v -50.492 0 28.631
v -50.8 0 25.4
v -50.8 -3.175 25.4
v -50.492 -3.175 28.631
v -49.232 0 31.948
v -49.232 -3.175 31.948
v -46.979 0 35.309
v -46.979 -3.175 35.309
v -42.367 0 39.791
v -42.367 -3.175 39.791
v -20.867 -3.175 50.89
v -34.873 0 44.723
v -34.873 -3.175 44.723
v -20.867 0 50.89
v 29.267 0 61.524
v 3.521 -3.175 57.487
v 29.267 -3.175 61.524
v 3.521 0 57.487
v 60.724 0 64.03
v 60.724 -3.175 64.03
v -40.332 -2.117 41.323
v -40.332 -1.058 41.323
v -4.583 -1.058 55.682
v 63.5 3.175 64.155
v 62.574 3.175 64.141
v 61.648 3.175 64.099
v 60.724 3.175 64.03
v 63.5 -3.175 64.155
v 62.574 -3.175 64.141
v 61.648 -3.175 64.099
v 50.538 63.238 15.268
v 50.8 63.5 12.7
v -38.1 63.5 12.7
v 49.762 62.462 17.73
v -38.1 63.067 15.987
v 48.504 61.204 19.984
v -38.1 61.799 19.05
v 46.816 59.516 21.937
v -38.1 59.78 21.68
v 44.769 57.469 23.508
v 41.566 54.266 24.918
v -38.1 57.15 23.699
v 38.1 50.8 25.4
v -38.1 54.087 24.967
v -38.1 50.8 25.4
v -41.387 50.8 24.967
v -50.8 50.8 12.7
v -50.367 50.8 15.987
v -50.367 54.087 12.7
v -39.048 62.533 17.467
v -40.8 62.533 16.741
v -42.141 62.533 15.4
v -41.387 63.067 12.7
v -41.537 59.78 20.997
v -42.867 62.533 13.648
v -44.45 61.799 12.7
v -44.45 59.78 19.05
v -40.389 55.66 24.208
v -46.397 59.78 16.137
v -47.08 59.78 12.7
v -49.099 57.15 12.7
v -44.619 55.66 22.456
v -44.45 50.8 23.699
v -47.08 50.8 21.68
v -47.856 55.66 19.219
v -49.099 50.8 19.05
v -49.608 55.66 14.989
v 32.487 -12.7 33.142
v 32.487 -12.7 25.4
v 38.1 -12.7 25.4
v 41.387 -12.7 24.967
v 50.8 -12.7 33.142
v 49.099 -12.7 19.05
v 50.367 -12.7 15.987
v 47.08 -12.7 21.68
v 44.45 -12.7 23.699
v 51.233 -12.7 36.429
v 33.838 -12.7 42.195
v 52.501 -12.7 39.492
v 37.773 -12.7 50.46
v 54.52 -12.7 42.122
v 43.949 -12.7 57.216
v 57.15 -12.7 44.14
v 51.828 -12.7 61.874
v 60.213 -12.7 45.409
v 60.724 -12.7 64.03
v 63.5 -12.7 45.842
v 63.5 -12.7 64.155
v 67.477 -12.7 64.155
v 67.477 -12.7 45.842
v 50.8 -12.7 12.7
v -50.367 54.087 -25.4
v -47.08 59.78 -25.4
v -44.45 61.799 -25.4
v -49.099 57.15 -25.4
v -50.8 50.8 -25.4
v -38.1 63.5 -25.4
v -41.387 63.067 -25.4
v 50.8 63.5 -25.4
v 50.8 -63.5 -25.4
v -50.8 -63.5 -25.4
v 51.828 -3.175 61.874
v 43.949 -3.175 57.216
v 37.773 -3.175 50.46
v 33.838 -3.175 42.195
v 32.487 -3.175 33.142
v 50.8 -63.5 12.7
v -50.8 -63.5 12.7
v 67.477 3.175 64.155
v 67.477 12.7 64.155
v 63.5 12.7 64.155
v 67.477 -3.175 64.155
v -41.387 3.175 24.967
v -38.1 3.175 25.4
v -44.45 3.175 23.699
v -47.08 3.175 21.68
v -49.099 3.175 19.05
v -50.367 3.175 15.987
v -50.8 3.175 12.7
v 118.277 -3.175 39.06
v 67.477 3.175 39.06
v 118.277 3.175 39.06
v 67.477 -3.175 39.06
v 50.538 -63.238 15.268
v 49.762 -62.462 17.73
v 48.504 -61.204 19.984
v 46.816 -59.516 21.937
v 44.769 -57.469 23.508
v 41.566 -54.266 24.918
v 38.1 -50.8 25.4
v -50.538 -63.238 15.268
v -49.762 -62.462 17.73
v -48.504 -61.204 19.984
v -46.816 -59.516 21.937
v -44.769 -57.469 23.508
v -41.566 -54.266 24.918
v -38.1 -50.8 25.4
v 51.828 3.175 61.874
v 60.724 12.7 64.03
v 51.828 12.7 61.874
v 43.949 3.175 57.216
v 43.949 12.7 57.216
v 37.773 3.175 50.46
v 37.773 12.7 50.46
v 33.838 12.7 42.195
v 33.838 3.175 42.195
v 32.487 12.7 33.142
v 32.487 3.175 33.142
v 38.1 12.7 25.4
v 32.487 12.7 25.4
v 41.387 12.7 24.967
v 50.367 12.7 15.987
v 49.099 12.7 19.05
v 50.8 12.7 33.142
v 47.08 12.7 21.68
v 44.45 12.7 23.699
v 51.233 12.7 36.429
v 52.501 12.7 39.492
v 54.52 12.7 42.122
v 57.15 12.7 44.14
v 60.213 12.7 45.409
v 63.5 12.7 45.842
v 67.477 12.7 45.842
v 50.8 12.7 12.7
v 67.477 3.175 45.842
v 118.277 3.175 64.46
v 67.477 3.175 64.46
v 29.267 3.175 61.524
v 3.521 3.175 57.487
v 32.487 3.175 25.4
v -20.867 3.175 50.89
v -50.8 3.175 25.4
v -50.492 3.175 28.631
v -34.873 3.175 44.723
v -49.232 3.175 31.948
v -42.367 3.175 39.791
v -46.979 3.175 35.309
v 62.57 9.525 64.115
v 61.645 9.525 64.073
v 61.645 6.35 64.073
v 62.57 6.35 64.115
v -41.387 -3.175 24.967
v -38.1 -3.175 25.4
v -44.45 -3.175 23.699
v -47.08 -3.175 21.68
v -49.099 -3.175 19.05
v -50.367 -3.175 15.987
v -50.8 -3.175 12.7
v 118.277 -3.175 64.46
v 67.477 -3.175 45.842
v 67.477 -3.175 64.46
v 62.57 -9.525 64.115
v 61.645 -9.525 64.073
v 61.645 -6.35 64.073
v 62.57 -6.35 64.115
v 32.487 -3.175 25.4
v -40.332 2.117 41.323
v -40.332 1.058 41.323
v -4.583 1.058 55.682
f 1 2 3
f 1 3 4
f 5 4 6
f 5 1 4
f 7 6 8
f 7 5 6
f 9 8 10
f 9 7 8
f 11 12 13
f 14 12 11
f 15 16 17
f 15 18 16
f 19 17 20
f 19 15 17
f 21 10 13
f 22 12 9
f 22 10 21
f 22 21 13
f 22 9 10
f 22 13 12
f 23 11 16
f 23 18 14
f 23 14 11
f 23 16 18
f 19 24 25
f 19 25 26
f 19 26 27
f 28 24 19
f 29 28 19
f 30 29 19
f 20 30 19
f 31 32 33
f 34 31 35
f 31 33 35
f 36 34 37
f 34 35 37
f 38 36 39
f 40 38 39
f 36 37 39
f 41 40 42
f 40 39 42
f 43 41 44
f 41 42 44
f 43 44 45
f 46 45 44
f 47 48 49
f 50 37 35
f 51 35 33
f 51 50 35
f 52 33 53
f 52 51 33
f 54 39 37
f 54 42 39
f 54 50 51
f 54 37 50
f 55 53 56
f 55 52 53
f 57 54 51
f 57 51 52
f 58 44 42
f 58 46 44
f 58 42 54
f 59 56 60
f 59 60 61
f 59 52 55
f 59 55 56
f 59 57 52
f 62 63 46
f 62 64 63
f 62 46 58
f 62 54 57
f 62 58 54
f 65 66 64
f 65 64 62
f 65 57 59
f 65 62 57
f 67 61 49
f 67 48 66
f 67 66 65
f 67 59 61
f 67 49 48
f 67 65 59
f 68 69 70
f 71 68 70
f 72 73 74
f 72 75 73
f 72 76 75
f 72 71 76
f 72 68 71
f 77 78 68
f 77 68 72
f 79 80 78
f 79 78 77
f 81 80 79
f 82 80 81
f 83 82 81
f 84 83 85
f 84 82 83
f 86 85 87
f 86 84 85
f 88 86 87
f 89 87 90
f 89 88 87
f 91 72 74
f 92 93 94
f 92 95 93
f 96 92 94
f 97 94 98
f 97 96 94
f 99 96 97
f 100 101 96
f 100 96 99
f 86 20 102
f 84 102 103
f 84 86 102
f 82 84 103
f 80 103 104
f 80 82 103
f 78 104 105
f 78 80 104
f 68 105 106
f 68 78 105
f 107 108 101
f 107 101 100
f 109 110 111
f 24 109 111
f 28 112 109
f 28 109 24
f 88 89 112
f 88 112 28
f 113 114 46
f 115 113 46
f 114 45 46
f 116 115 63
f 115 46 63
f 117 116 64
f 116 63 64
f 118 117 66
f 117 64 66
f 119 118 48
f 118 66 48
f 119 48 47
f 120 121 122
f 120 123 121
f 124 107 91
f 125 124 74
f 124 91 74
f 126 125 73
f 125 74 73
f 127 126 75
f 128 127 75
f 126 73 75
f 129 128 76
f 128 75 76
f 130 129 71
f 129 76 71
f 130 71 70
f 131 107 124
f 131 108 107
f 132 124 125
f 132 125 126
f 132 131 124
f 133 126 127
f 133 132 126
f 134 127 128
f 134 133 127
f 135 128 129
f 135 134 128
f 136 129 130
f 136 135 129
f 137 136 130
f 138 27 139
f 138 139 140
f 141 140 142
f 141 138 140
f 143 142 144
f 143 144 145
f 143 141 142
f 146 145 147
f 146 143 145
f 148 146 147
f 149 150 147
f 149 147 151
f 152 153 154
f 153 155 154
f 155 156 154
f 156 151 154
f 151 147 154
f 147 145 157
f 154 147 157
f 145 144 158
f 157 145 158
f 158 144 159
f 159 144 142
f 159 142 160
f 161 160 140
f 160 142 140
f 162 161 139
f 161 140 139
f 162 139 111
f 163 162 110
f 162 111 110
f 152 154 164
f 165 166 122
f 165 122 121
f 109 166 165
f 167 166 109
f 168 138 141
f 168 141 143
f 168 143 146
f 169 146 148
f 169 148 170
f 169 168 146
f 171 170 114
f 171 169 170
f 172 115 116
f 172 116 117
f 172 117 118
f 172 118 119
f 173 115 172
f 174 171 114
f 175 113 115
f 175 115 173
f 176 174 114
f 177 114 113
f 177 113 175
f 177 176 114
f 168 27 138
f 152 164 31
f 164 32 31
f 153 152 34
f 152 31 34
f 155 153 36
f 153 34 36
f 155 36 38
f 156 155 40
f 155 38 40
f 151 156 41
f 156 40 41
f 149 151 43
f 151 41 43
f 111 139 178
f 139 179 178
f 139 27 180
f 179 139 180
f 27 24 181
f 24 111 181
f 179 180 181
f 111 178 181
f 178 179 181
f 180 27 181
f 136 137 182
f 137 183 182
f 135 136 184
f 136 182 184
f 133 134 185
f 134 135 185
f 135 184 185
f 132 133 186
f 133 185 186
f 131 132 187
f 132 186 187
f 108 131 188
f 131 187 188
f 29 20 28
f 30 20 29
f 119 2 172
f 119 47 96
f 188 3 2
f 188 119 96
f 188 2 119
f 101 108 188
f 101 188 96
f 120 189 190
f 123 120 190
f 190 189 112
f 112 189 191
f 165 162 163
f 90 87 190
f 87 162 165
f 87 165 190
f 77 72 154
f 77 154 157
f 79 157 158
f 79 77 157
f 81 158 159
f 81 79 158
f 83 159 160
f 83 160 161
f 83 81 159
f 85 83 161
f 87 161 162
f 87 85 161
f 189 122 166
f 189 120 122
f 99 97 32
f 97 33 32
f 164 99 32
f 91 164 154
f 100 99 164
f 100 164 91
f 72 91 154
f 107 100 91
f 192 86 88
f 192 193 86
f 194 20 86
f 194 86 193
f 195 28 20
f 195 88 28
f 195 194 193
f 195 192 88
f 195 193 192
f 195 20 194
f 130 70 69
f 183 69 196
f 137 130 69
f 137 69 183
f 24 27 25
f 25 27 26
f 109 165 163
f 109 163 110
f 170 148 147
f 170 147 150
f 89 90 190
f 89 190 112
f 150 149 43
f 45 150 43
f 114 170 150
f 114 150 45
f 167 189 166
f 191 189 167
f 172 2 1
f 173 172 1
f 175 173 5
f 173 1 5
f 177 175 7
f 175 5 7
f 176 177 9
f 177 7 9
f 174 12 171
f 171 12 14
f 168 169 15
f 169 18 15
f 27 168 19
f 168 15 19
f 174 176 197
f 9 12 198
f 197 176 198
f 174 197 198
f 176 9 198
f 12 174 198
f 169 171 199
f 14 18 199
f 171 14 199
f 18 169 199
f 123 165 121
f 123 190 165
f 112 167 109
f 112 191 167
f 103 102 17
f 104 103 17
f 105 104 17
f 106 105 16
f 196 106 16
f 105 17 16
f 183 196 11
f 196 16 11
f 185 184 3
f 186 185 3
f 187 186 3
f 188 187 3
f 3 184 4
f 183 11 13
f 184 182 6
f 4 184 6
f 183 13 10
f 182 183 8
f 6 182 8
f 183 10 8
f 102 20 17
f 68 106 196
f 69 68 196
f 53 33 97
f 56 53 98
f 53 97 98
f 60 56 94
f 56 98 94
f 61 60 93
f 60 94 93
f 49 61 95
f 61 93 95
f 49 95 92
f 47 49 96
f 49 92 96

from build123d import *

# Parameters (mm, degrees)
F1_DEPTH = 63.5
F2_DEPTH = 12.7
F3_DEPTH = 3.175
F4_R     = 12.7


with BuildPart() as f1:
    # F0 (on Front) → F1 (new body, symmetric)
    with BuildSketch(Plane.XZ):
        Polygon((32.4870109211, 25.4), (-50.8, 25.4), (-50.8, -25.4), (50.8, -25.4), (50.8, 25.4), align=None)
    extrude(amount=F1_DEPTH, both=True)

    # F0 (on Front) → F2 (join, symmetric)
    with BuildSketch(Plane.XZ):
        with BuildLine():
            Line((32.4870109211, 33.1416912377), (32.4870109211, 25.4))
            Line((32.4870109211, 25.4), (50.8, 25.4))
            Line((50.8, 25.4), (50.8, 33.1416912377))
            ThreePointArc((50.8, 33.1416912377), (54.5197438789, 42.1219473588), (63.5, 45.8416912377))
            Line((63.5, 45.8416912377), (67.4773146418, 45.8416912377))
            Line((67.4773146418, 45.8416912377), (67.4773146418, 64.1546803166))
            Line((67.4773146418, 64.1546803166), (63.5, 64.1546803166))
            add(Edge.make_bspline(
                [(60.7238640338, 64.0301771298), (61.6427833631, 64.0736819476), (62.5681528274, 64.1151925709), (63.5, 64.1546803166)],
                knots=[119.3459466449, 119.3459466449, 119.3459466449, 119.3459466449, 120.6914050231, 120.6914050231, 120.6914050231, 120.6914050231], degree=3))
            ThreePointArc((60.7238640338, 64.0301771298), (40.6100265836, 54.066666951), (32.4870109211, 33.1416912377))
        make_face()
    extrude(amount=F2_DEPTH, both=True)

    # F0 (on Front) → F3 (join, symmetric)
    with BuildSketch(Plane.XZ):
        with BuildLine():
            add(Edge.make_bspline(
                [(-50.8, 25.4), (-51.5467154079, 40.6214778369), (-20.7868679356, 60.1711772937), (60.7238640338, 64.0301771298)],
                knots=[0, 0, 0, 0, 119.3459466449, 119.3459466449, 119.3459466449, 119.3459466449], degree=3))
            Line((-50.8, 25.4), (32.4870109211, 25.4))
            Line((32.4870109211, 25.4), (32.4870109211, 33.1416912377))
            ThreePointArc((32.4870109211, 33.1416912377), (40.6100265836, 54.066666951), (60.7238640338, 64.0301771298))
        make_face()
        Polygon((32.4870109211, 25.4), (-50.8, 25.4), (-50.8, -25.4), (50.8, -25.4), (50.8, 25.4), align=None)
        with BuildLine():
            Line((32.4870109211, 33.1416912377), (32.4870109211, 25.4))
            Line((32.4870109211, 25.4), (50.8, 25.4))
            Line((50.8, 25.4), (50.8, 33.1416912377))
            ThreePointArc((50.8, 33.1416912377), (54.5197438789, 42.1219473588), (63.5, 45.8416912377))
            Line((63.5, 45.8416912377), (67.4773146418, 45.8416912377))
            Line((67.4773146418, 45.8416912377), (67.4773146418, 64.1546803166))
            Line((67.4773146418, 64.1546803166), (63.5, 64.1546803166))
            add(Edge.make_bspline(
                [(60.7238640338, 64.0301771298), (61.6427833631, 64.0736819476), (62.5681528274, 64.1151925709), (63.5, 64.1546803166)],
                knots=[119.3459466449, 119.3459466449, 119.3459466449, 119.3459466449, 120.6914050231, 120.6914050231, 120.6914050231, 120.6914050231], degree=3))
            ThreePointArc((60.7238640338, 64.0301771298), (40.6100265836, 54.066666951), (32.4870109211, 33.1416912377))
        make_face()
        with BuildLine():
            ThreePointArc((63.5, 64.1546803166), (62.1105367991, 64.1235388847), (60.7238640338, 64.0301771298))
            add(Edge.make_bspline(
                [(60.7238640338, 64.0301771298), (61.6427833631, 64.0736819476), (62.5681528274, 64.1151925709), (63.5, 64.1546803166)],
                knots=[119.3459466449, 119.3459466449, 119.3459466449, 119.3459466449, 120.6914050231, 120.6914050231, 120.6914050231, 120.6914050231], degree=3))
        make_face()
        Polygon((67.4773146418, 64.4600404125), (67.4773146418, 64.1546803166), (67.4773146418, 45.8416912377), (67.4773146418, 39.0600404125), (118.2773146418, 39.0600404125), (118.2773146418, 64.4600404125), align=None)
    extrude(amount=F3_DEPTH, both=True)

    # F4
    f4_edges = [f1.edges().sort_by_distance(p)[0] for p in [
        (-50.8, 33.3375, 25.4),
        (0, 63.5, 25.4),
        (50.8, 38.1, 25.4),
        (0, -63.5, 25.4),
        (50.8, -38.1, 25.4),
        (-50.8, -33.3375, 25.4),
        (-50.8, 63.5, 0),
    ]]
    fillet(f4_edges, radius=F4_R)


solid = f1.part
